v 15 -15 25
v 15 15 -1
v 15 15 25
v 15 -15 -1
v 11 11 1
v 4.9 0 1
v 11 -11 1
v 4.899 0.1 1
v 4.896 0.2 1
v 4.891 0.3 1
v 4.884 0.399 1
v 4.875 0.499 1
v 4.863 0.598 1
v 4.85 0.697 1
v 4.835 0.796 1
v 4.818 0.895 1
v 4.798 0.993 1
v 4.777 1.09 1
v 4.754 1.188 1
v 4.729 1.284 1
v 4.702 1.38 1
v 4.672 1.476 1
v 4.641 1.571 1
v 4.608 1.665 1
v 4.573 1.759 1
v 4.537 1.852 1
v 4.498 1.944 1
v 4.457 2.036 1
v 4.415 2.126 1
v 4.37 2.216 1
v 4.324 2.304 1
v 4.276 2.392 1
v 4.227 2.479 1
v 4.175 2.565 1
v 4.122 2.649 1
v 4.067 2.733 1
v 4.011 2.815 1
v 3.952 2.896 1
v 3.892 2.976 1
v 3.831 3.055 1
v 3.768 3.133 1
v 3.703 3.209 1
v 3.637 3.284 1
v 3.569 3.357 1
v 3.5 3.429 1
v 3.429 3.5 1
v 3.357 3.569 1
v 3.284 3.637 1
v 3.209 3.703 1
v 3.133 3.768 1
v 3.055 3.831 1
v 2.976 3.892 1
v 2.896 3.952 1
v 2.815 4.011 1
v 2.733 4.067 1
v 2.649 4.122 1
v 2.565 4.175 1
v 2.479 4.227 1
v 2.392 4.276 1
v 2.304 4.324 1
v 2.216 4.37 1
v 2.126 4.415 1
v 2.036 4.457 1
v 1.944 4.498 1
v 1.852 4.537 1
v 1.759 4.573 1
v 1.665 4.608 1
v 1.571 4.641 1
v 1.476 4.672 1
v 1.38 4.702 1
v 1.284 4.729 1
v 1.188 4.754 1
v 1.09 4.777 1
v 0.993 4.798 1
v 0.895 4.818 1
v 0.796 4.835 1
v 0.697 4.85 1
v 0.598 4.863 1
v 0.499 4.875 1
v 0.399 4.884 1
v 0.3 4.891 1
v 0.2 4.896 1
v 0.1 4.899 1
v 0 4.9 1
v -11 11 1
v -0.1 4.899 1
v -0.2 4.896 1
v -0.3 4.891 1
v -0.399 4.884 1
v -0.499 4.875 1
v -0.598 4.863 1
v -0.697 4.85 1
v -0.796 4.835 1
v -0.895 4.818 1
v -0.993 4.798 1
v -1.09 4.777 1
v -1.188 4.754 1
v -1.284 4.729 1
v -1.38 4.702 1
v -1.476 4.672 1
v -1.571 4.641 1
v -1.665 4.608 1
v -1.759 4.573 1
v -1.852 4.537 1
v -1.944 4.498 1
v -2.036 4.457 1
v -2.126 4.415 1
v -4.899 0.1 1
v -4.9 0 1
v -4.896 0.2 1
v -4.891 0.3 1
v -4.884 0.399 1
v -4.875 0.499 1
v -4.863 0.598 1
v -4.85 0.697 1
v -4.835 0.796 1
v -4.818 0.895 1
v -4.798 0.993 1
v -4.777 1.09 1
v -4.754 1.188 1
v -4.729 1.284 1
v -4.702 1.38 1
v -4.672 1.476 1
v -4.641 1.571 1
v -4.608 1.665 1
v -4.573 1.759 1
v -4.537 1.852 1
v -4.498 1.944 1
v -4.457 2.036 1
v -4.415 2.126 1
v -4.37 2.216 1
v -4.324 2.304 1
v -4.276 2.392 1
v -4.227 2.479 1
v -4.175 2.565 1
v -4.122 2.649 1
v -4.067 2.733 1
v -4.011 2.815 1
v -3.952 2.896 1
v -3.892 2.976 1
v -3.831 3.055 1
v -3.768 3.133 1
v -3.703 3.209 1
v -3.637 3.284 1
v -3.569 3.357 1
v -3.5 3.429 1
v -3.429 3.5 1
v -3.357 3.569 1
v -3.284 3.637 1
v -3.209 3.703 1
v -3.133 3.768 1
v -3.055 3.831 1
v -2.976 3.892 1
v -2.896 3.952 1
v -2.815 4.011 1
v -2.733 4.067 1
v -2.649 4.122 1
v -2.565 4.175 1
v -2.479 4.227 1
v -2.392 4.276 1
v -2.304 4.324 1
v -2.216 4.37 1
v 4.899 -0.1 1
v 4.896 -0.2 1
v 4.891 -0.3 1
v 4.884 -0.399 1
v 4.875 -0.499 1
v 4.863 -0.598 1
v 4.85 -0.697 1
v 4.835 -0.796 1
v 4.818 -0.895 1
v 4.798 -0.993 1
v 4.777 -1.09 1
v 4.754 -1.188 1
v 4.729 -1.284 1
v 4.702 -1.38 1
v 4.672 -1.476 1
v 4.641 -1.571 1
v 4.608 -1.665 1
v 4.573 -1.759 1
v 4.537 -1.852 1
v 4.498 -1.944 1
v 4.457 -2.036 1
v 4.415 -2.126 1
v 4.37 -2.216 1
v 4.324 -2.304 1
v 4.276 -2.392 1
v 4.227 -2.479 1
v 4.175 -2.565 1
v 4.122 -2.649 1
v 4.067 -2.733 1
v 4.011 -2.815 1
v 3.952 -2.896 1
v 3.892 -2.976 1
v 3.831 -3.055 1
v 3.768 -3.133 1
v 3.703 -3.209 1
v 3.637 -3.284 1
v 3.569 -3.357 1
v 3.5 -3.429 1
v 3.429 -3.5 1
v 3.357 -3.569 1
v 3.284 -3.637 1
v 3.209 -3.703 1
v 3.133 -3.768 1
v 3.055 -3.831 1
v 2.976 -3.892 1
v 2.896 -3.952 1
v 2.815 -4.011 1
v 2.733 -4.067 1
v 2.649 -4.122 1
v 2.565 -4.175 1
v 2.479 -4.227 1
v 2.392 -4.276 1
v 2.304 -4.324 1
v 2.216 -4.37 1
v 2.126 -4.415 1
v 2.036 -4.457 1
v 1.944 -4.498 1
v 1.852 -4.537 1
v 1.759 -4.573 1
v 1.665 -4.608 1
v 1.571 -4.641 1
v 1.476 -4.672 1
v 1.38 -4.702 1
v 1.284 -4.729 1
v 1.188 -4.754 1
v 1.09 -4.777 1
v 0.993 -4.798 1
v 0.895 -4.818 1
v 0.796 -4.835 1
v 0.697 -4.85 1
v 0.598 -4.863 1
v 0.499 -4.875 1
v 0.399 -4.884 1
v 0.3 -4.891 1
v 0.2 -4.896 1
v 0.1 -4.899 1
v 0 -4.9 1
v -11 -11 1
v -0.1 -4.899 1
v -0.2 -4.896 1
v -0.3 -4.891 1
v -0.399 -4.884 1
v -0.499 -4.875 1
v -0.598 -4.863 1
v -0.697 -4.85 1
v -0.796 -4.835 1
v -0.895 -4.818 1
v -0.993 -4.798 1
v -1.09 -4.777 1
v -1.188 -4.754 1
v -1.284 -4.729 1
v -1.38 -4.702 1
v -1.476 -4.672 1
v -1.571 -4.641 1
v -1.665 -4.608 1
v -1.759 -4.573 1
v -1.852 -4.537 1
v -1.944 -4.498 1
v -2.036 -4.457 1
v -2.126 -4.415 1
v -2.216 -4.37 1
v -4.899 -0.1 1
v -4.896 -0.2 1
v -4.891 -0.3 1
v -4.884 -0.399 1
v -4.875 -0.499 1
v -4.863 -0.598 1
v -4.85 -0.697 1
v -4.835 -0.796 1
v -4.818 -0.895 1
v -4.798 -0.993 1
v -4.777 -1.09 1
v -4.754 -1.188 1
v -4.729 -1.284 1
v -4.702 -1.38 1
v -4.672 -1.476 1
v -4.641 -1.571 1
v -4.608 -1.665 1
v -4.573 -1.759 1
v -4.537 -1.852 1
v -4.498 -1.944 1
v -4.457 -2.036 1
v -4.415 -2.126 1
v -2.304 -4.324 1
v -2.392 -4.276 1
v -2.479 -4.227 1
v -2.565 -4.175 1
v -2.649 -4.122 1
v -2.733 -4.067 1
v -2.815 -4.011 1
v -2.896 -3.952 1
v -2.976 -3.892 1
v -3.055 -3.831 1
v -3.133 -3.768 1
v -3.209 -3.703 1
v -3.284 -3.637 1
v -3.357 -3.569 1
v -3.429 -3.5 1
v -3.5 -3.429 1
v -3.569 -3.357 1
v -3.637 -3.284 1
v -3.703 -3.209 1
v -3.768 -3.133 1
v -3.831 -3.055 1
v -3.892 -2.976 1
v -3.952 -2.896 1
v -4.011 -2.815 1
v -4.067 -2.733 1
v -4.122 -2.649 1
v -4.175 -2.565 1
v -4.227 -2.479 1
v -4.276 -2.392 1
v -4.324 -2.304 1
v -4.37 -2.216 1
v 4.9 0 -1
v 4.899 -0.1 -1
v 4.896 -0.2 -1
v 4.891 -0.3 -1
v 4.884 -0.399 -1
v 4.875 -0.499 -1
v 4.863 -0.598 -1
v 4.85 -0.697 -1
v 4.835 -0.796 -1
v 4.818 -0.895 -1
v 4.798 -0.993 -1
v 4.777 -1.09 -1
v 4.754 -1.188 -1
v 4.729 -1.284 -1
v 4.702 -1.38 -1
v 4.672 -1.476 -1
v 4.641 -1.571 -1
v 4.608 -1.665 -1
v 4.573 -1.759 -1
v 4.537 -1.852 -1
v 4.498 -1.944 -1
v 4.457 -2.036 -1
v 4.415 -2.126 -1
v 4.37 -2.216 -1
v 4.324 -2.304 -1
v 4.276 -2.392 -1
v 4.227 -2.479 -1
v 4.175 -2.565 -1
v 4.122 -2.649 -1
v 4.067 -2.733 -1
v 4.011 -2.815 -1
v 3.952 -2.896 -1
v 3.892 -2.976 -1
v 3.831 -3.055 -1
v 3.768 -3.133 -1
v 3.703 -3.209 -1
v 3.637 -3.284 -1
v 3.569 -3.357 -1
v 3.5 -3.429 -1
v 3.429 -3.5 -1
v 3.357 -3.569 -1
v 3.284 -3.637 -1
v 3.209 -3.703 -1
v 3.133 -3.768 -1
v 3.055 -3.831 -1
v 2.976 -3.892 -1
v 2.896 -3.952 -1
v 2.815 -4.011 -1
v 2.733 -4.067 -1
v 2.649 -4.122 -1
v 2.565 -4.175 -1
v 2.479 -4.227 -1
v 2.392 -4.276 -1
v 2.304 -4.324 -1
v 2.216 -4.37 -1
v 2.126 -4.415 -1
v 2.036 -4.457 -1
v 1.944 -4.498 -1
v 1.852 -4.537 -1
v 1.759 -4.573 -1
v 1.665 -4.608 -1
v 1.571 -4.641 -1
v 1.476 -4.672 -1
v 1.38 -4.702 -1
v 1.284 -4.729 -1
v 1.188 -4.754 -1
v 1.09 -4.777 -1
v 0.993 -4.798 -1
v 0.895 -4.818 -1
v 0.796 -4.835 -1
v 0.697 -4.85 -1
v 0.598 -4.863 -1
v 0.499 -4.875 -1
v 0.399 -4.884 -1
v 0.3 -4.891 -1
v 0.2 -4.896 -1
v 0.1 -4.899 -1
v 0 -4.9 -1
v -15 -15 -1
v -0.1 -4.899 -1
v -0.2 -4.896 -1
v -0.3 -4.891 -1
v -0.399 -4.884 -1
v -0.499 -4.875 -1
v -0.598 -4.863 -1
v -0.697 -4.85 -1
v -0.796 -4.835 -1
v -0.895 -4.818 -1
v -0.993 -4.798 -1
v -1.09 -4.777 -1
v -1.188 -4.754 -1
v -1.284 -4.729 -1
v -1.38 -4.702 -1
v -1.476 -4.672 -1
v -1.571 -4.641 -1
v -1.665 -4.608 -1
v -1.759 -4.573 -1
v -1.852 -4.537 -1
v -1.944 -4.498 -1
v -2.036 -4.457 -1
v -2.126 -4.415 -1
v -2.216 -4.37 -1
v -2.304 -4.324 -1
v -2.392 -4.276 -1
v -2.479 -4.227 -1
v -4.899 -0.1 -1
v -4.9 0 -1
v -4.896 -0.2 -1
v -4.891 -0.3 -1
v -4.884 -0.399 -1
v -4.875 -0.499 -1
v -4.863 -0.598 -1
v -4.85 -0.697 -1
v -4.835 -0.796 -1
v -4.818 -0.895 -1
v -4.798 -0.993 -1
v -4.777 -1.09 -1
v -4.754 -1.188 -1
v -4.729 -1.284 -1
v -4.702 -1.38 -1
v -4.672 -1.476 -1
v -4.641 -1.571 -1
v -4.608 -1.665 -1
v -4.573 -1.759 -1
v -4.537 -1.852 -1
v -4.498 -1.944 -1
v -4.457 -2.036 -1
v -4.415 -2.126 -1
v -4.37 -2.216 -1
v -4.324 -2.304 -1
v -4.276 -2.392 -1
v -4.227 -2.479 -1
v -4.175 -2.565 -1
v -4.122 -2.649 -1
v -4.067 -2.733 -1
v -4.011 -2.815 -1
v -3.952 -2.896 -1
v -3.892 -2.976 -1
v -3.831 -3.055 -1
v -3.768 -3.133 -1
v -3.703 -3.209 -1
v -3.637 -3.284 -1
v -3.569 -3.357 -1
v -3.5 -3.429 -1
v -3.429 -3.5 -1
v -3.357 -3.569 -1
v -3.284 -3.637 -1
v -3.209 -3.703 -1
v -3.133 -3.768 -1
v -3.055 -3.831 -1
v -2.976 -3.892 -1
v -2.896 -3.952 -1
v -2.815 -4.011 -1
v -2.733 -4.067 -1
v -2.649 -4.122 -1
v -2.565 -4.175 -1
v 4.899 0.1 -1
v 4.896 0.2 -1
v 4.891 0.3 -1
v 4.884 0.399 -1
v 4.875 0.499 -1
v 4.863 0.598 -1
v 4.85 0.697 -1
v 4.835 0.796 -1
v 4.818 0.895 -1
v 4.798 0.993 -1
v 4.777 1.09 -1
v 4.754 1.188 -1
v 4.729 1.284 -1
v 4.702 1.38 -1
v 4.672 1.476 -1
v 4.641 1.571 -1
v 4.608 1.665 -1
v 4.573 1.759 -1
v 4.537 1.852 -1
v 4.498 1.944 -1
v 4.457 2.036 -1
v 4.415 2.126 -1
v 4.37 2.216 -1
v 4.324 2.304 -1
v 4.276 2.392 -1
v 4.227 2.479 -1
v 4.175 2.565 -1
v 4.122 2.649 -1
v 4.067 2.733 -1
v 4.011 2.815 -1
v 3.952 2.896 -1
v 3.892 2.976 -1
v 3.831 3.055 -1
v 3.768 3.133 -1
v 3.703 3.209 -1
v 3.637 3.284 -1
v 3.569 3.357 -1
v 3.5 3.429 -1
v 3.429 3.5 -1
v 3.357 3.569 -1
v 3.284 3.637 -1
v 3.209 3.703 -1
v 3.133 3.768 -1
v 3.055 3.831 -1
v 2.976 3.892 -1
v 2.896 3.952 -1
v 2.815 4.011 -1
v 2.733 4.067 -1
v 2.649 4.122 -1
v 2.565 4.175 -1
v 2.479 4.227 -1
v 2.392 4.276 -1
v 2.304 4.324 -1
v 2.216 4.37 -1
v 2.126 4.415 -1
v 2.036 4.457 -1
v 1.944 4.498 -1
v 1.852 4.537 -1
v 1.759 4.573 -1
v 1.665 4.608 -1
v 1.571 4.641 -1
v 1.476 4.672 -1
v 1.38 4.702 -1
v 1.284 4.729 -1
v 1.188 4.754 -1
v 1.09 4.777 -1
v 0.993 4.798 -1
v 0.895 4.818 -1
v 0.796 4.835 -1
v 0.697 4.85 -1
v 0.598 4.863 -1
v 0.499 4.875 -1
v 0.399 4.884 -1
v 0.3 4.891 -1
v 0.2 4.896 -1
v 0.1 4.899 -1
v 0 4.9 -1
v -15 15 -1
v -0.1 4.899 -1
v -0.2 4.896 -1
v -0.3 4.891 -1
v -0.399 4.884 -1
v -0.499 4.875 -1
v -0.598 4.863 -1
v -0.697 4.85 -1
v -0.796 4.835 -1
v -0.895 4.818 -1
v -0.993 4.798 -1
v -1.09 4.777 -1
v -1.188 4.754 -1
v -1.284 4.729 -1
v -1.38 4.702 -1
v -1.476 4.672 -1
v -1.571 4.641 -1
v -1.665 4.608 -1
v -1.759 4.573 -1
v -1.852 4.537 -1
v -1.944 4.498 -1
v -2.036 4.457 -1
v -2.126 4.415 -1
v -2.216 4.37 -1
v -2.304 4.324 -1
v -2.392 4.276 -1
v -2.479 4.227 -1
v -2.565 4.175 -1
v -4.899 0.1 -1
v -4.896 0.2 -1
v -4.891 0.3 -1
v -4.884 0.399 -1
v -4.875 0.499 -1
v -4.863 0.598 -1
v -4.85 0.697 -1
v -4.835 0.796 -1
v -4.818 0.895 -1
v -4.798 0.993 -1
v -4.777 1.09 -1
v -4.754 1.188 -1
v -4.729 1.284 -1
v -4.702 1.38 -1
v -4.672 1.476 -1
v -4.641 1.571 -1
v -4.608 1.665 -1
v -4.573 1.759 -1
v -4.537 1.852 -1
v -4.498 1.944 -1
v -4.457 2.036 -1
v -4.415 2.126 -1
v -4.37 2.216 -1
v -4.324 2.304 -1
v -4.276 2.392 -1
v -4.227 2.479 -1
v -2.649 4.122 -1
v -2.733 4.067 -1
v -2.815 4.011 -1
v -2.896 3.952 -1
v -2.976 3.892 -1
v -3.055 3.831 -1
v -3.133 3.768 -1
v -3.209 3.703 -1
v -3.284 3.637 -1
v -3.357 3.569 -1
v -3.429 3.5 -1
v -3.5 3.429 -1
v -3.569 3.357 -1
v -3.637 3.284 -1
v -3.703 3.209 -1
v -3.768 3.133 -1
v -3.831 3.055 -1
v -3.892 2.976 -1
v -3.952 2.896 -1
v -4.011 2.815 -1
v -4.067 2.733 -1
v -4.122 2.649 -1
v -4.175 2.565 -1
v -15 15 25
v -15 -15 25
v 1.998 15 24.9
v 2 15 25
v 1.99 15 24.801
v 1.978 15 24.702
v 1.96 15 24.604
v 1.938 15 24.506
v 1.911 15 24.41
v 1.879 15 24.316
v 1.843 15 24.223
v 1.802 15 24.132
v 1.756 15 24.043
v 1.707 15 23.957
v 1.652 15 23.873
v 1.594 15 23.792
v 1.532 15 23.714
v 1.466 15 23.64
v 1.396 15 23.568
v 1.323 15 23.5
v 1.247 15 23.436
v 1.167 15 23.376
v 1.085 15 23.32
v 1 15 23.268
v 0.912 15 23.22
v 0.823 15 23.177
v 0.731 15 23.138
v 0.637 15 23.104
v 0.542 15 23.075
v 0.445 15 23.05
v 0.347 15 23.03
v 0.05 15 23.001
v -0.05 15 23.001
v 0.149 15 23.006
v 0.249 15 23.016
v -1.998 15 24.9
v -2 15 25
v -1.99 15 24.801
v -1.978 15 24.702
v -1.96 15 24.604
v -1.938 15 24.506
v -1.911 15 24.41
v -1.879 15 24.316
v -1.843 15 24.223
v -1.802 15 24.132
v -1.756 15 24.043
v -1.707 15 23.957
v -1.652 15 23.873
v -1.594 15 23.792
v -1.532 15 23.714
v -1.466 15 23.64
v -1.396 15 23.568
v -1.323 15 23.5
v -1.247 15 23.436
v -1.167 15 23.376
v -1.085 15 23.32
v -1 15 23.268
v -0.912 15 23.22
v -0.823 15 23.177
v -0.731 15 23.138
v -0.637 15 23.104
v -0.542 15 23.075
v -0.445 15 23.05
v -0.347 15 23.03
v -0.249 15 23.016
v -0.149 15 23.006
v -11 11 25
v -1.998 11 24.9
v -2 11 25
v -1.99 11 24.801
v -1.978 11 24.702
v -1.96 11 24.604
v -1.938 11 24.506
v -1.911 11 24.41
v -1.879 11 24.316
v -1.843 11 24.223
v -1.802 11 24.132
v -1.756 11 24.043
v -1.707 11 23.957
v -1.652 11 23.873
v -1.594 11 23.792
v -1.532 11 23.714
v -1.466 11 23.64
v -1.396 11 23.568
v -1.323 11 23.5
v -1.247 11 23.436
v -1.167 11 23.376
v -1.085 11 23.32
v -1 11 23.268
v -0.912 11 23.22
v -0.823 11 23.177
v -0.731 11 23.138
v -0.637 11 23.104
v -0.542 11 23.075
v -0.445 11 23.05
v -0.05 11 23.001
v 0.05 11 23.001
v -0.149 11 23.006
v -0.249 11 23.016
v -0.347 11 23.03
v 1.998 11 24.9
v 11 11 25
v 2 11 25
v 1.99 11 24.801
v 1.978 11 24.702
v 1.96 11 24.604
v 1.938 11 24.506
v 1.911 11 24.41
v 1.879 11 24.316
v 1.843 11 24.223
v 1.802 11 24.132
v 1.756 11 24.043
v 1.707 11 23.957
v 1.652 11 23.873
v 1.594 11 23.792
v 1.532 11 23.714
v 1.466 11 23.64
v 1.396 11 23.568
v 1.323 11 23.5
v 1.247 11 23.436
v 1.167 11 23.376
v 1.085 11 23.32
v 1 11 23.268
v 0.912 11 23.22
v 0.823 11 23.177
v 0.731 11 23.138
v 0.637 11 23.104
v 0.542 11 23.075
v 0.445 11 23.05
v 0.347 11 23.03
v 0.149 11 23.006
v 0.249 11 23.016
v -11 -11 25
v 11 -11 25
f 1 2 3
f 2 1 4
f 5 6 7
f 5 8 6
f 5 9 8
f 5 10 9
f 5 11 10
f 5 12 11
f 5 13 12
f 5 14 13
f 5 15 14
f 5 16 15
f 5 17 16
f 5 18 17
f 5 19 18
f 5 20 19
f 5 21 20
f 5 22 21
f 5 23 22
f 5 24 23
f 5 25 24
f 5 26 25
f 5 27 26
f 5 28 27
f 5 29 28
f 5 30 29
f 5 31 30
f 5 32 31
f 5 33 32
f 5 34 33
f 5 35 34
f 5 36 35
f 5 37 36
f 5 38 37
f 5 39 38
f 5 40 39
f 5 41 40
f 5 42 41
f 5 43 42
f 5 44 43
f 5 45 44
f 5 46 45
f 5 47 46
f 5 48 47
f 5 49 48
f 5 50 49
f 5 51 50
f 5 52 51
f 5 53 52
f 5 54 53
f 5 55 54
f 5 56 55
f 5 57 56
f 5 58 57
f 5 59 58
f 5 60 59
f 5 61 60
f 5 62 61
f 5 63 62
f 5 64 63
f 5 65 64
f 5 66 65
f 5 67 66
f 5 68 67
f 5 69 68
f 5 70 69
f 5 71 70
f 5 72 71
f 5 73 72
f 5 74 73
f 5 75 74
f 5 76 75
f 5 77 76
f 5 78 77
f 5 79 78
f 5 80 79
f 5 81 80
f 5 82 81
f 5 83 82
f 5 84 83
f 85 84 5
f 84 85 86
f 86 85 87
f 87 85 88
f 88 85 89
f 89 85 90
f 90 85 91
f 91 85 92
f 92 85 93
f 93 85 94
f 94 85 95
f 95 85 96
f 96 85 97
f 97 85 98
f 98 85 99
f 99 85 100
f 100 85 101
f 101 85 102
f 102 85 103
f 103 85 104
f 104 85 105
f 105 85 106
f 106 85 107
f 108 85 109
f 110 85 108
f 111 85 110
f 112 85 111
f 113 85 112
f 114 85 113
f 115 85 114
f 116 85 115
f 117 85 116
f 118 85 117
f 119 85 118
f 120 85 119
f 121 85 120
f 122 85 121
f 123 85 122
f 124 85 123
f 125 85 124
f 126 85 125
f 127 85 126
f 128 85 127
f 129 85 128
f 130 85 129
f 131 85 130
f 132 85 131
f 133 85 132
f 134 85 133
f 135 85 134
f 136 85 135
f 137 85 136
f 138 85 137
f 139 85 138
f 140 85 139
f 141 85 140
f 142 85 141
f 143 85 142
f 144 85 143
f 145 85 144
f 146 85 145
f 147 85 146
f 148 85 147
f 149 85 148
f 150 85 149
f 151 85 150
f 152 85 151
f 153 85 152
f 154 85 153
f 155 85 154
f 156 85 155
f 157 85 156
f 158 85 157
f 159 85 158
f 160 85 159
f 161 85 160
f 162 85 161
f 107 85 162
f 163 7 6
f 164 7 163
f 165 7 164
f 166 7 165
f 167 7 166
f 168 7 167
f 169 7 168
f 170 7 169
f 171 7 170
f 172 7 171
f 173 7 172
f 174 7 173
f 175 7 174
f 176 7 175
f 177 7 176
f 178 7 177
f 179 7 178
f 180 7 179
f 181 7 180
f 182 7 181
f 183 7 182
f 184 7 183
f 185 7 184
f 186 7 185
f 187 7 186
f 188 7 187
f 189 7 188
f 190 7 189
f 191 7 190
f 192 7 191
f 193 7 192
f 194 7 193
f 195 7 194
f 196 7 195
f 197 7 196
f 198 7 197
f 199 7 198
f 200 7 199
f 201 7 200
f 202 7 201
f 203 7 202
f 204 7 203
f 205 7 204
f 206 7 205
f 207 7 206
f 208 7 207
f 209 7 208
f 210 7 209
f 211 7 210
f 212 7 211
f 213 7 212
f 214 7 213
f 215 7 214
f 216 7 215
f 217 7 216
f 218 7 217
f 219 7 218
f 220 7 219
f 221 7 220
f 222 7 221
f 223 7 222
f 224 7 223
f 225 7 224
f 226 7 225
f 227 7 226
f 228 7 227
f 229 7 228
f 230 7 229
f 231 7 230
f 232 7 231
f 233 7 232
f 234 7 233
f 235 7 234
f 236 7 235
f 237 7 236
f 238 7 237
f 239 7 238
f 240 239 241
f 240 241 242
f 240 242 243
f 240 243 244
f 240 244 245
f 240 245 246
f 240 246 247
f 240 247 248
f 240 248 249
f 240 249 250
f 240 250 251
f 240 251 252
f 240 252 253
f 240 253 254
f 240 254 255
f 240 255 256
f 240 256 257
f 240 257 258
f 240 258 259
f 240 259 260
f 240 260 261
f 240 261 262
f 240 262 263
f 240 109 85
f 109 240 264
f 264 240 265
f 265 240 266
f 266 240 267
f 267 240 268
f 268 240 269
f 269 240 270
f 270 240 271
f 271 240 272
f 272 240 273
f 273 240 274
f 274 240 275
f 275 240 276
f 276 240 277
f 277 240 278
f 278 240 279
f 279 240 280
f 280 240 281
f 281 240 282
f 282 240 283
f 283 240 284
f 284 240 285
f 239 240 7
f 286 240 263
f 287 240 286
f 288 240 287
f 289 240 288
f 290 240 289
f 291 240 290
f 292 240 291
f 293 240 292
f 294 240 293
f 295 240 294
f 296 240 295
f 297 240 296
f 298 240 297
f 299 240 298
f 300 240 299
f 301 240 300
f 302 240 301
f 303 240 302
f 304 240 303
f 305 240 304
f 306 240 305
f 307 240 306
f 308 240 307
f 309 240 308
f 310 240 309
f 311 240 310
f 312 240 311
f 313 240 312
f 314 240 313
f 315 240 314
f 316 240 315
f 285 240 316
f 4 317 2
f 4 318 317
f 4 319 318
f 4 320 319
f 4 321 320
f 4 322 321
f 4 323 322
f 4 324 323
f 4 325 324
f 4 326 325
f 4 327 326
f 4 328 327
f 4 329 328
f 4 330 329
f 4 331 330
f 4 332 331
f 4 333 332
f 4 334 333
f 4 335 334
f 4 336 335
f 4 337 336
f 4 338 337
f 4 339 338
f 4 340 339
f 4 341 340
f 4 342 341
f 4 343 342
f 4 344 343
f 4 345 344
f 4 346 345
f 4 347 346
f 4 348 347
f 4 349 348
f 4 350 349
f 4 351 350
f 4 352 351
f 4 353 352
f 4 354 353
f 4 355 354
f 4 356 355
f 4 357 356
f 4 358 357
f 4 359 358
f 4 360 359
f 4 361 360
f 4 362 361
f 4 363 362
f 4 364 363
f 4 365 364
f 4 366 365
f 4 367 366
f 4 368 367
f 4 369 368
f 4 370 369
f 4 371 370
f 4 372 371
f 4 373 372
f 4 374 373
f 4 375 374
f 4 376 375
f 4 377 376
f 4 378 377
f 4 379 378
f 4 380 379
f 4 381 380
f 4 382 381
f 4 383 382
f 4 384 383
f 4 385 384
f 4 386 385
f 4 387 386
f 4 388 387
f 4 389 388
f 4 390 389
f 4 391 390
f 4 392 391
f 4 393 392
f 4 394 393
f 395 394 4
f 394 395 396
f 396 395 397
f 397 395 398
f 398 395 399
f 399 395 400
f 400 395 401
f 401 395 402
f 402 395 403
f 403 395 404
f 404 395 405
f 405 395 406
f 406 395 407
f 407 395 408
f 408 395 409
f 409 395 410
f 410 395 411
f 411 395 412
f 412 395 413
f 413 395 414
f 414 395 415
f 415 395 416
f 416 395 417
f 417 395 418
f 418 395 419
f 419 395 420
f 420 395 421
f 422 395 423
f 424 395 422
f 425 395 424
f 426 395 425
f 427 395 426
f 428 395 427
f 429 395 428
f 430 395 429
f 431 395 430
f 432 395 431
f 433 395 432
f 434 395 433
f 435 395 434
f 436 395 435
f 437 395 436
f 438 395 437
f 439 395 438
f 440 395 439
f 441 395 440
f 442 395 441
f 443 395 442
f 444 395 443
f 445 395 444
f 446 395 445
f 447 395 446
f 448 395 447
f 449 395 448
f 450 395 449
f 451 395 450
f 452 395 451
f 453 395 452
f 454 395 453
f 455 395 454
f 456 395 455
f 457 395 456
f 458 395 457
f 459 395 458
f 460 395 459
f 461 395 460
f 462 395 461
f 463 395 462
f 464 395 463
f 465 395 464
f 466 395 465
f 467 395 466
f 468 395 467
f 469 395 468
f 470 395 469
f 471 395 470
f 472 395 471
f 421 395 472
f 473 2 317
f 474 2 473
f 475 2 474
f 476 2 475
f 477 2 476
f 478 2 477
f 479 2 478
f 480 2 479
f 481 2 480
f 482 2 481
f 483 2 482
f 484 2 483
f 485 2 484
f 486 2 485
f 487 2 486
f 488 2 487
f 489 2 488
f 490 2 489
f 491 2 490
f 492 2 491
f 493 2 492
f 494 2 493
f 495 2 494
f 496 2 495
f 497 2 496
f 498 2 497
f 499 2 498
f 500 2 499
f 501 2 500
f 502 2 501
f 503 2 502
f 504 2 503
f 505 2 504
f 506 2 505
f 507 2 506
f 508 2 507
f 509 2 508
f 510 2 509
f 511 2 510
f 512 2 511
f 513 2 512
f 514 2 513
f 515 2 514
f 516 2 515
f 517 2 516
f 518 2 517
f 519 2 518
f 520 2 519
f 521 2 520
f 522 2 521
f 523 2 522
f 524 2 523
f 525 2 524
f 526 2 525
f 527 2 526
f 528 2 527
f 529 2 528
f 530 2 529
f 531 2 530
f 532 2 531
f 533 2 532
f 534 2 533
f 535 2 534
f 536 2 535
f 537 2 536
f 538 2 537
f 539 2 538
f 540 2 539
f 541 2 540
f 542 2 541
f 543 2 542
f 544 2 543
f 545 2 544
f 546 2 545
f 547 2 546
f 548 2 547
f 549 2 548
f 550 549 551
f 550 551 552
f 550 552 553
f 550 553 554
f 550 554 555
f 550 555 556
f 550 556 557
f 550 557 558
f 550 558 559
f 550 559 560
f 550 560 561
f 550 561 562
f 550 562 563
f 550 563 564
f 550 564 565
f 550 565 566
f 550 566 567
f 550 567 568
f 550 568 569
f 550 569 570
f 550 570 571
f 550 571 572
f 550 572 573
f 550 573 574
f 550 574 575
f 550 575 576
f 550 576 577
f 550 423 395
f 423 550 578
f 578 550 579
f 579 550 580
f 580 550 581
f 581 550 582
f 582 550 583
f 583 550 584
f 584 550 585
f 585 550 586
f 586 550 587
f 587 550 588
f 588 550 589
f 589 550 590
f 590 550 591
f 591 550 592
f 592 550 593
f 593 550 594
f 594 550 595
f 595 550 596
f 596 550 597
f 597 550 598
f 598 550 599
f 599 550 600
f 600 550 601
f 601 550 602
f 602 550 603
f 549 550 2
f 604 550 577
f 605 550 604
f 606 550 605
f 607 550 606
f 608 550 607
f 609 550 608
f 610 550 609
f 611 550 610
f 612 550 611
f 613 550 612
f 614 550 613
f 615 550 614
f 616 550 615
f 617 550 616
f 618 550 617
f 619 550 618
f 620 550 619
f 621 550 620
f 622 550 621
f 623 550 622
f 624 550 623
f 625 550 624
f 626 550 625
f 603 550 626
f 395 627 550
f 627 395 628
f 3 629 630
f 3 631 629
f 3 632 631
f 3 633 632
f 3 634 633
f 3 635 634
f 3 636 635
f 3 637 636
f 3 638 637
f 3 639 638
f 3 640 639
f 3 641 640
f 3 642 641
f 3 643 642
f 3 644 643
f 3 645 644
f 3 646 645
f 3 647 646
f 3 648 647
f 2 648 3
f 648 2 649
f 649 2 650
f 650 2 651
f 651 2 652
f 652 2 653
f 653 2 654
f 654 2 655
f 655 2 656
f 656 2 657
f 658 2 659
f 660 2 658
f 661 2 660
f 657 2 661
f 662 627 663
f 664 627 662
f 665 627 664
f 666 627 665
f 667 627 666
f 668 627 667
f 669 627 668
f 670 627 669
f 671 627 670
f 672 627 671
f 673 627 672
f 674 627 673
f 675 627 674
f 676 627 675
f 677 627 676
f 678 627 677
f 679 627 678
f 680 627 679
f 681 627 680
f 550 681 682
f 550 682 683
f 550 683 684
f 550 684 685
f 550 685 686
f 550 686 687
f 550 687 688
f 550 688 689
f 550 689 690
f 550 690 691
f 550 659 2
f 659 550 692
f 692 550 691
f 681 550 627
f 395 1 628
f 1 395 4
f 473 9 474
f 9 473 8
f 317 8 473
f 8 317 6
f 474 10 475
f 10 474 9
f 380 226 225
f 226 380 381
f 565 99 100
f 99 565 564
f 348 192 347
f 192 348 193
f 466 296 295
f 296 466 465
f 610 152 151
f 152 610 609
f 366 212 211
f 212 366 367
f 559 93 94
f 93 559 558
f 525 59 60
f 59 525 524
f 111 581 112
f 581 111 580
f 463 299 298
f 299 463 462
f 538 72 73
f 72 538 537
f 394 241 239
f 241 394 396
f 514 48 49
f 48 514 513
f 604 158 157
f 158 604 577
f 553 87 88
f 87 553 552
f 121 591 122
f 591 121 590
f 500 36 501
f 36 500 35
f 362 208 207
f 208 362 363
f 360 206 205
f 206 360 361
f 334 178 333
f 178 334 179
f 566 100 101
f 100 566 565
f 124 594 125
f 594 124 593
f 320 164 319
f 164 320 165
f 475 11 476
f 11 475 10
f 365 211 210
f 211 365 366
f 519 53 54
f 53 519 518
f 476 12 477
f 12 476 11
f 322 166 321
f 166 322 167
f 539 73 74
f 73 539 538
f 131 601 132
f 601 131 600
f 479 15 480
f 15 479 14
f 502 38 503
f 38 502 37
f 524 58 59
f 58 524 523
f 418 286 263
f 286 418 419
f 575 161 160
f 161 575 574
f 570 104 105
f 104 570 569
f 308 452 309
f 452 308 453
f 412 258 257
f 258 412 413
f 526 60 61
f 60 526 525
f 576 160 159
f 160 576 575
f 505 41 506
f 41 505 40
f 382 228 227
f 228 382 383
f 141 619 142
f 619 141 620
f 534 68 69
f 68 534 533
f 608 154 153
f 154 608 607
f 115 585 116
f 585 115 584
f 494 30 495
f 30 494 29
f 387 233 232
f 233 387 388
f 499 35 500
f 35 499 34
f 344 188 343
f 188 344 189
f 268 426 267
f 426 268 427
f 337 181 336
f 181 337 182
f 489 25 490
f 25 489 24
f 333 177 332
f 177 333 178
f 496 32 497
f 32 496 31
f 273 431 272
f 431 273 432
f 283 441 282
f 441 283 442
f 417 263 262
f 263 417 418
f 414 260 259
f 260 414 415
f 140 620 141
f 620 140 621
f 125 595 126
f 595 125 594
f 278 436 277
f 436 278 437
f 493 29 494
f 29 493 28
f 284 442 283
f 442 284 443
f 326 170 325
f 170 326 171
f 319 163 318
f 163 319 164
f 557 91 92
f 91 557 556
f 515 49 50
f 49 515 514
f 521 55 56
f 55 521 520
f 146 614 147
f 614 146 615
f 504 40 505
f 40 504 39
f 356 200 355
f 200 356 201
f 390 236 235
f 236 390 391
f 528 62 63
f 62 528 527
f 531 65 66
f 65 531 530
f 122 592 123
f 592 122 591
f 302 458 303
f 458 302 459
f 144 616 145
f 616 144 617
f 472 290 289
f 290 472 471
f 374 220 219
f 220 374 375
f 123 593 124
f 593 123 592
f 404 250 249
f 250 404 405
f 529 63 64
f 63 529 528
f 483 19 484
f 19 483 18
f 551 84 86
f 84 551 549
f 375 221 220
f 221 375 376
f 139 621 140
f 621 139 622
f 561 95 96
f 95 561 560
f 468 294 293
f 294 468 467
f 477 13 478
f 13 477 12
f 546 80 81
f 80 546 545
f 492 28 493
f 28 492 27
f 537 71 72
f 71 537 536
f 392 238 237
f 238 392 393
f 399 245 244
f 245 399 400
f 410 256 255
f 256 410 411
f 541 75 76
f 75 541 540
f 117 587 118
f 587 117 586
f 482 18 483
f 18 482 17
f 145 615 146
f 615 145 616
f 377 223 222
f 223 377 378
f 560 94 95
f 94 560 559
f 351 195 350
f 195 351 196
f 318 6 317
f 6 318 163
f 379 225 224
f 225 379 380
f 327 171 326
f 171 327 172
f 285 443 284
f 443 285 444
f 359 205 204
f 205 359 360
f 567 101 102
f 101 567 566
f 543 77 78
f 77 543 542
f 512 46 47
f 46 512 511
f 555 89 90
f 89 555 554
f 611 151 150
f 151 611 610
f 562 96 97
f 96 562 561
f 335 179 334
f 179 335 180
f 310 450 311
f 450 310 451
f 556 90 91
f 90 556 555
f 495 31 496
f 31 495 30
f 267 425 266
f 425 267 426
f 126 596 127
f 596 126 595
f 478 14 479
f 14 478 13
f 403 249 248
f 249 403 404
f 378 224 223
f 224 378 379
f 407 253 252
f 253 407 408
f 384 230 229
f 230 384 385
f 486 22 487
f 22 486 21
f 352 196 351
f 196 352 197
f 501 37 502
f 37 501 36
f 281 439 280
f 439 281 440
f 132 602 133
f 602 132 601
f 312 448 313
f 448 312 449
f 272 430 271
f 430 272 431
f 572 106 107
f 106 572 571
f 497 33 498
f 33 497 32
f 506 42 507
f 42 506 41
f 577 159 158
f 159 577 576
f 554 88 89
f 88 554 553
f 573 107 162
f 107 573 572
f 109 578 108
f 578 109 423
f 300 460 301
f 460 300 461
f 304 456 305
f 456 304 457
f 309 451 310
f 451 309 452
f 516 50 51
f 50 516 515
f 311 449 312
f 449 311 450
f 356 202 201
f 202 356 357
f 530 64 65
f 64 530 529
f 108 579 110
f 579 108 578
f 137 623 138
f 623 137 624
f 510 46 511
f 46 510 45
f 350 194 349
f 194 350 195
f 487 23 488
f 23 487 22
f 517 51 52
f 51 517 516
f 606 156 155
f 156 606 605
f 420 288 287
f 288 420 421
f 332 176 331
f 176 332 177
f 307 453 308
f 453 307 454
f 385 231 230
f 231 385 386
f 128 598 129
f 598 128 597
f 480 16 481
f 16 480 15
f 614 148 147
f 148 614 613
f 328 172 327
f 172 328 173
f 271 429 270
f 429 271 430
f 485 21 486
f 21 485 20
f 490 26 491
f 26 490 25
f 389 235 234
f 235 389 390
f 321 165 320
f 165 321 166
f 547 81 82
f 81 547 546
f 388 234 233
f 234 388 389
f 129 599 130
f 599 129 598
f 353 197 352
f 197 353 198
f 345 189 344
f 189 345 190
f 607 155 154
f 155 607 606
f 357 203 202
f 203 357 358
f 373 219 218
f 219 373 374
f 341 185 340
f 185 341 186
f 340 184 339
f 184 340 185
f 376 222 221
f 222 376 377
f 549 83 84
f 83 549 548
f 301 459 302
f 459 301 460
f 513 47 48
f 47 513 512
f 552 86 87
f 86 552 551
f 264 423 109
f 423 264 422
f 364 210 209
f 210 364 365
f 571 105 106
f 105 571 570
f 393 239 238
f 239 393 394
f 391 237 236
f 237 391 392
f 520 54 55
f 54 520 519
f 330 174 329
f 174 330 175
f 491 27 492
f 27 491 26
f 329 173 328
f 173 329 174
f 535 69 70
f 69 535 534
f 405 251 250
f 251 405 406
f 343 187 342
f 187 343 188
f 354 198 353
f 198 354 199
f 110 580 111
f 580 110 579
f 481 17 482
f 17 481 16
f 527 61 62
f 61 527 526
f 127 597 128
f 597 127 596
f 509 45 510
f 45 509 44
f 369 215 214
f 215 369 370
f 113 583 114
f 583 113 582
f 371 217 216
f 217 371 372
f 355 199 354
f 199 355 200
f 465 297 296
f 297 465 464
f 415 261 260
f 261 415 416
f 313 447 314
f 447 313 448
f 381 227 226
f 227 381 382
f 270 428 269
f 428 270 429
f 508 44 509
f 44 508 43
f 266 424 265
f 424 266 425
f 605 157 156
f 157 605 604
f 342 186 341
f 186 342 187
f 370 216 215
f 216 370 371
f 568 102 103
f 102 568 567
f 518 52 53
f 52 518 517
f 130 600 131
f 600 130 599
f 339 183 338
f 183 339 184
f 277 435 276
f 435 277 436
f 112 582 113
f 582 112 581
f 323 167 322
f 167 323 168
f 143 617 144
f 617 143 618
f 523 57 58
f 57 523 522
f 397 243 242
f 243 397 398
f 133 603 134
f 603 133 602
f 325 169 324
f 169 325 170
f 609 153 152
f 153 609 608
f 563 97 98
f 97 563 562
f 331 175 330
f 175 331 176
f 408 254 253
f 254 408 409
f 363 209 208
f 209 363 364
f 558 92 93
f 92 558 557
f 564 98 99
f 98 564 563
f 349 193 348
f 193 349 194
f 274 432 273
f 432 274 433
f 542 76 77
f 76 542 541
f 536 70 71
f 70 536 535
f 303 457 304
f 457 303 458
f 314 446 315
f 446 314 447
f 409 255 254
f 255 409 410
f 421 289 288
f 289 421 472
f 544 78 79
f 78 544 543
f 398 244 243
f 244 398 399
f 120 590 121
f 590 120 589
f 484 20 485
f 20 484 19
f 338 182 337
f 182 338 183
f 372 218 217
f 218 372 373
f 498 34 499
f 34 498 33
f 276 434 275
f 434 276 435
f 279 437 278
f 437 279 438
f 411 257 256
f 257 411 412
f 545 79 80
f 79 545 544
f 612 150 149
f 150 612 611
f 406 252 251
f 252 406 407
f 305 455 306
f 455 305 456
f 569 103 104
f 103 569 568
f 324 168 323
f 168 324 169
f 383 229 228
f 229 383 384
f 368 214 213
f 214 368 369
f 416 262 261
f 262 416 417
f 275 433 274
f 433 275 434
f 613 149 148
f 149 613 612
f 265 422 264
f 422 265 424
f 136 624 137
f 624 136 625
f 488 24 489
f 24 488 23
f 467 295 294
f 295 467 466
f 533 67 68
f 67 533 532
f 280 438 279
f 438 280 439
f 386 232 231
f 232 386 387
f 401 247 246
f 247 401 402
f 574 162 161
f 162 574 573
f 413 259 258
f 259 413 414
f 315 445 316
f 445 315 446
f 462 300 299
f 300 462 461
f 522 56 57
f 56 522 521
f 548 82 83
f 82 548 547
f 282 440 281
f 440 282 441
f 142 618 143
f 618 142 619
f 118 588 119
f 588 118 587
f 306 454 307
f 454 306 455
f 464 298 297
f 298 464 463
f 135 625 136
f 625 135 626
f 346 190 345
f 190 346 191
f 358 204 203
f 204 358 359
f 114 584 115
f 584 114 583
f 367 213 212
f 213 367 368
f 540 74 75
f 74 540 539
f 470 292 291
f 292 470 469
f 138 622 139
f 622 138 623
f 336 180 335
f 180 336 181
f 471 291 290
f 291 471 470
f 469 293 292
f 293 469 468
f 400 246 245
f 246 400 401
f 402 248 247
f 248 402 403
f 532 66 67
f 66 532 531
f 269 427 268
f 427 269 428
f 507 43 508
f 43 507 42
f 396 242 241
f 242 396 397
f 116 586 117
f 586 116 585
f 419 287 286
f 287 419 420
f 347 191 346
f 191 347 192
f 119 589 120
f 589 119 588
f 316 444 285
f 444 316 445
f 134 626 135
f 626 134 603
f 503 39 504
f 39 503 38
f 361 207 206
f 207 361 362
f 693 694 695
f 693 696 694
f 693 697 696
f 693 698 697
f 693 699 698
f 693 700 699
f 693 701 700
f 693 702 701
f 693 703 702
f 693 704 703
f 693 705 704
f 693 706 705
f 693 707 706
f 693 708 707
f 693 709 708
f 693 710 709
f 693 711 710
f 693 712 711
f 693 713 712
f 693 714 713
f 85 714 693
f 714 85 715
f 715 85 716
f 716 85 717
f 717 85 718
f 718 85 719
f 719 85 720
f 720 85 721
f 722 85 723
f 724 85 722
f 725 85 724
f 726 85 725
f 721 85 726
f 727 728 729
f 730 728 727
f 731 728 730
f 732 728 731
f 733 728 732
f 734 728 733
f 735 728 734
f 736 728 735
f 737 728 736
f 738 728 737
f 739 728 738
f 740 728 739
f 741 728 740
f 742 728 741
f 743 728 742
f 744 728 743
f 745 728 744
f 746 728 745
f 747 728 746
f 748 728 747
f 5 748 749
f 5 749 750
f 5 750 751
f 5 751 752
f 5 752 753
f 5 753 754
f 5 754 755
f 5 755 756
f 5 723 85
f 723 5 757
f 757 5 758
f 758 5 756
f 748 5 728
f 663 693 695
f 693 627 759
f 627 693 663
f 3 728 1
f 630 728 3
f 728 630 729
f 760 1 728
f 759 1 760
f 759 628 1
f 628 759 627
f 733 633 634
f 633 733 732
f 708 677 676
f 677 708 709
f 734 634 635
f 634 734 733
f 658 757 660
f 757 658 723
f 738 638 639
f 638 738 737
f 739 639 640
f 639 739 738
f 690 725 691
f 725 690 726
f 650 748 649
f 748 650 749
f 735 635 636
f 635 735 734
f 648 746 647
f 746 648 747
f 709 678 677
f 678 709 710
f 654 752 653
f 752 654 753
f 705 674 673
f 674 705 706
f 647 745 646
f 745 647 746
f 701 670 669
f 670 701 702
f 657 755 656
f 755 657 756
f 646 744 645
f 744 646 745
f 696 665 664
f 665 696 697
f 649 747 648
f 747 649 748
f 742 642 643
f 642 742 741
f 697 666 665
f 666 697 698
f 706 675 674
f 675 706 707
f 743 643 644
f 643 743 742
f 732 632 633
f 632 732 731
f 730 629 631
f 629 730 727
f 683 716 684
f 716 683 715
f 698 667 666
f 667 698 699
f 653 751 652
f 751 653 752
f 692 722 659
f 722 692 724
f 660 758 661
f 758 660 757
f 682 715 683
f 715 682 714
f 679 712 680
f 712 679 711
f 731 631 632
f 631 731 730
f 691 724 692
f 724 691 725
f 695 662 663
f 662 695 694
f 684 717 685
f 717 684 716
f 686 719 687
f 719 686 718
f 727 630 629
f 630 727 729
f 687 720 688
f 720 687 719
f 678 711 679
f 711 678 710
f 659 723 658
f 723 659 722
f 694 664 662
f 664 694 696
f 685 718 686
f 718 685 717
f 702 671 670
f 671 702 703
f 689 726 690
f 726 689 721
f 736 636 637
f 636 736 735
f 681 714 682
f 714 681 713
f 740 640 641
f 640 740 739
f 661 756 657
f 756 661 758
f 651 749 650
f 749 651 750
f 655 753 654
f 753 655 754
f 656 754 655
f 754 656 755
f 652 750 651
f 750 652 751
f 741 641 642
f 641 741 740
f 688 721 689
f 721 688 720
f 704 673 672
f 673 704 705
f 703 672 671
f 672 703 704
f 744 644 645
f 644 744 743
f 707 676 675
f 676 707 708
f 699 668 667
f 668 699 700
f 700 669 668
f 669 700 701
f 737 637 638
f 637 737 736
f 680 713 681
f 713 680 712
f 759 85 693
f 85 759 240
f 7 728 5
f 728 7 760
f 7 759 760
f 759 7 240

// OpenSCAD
$fa = 1;
$fs = 0.1;

difference() {
    cube([30, 30, 2], center=true);

    cylinder(r=9.8/2, h=2.002, center= true);
}

translate([-13, 0, 12.5])
    rotate([0, 90, 0])
    cube([25, 30, 4], center=true);

translate([13, 0, 12.5])
    rotate([0, 90, 0])
    cube([25, 30, 4], center=true);

translate([0, -13, 12.5])
    rotate([90, 0, 0])
    cube([30, 25, 4], center=true);

difference() {
    translate([0, 13, 12.5])
        rotate([90, 0, 0])
        cube([30, 25, 4], center=true);

    translate([0, 13, 25])
        rotate([90, 0, 0])
        cylinder(r=2, h=4.002, center=true);
}
